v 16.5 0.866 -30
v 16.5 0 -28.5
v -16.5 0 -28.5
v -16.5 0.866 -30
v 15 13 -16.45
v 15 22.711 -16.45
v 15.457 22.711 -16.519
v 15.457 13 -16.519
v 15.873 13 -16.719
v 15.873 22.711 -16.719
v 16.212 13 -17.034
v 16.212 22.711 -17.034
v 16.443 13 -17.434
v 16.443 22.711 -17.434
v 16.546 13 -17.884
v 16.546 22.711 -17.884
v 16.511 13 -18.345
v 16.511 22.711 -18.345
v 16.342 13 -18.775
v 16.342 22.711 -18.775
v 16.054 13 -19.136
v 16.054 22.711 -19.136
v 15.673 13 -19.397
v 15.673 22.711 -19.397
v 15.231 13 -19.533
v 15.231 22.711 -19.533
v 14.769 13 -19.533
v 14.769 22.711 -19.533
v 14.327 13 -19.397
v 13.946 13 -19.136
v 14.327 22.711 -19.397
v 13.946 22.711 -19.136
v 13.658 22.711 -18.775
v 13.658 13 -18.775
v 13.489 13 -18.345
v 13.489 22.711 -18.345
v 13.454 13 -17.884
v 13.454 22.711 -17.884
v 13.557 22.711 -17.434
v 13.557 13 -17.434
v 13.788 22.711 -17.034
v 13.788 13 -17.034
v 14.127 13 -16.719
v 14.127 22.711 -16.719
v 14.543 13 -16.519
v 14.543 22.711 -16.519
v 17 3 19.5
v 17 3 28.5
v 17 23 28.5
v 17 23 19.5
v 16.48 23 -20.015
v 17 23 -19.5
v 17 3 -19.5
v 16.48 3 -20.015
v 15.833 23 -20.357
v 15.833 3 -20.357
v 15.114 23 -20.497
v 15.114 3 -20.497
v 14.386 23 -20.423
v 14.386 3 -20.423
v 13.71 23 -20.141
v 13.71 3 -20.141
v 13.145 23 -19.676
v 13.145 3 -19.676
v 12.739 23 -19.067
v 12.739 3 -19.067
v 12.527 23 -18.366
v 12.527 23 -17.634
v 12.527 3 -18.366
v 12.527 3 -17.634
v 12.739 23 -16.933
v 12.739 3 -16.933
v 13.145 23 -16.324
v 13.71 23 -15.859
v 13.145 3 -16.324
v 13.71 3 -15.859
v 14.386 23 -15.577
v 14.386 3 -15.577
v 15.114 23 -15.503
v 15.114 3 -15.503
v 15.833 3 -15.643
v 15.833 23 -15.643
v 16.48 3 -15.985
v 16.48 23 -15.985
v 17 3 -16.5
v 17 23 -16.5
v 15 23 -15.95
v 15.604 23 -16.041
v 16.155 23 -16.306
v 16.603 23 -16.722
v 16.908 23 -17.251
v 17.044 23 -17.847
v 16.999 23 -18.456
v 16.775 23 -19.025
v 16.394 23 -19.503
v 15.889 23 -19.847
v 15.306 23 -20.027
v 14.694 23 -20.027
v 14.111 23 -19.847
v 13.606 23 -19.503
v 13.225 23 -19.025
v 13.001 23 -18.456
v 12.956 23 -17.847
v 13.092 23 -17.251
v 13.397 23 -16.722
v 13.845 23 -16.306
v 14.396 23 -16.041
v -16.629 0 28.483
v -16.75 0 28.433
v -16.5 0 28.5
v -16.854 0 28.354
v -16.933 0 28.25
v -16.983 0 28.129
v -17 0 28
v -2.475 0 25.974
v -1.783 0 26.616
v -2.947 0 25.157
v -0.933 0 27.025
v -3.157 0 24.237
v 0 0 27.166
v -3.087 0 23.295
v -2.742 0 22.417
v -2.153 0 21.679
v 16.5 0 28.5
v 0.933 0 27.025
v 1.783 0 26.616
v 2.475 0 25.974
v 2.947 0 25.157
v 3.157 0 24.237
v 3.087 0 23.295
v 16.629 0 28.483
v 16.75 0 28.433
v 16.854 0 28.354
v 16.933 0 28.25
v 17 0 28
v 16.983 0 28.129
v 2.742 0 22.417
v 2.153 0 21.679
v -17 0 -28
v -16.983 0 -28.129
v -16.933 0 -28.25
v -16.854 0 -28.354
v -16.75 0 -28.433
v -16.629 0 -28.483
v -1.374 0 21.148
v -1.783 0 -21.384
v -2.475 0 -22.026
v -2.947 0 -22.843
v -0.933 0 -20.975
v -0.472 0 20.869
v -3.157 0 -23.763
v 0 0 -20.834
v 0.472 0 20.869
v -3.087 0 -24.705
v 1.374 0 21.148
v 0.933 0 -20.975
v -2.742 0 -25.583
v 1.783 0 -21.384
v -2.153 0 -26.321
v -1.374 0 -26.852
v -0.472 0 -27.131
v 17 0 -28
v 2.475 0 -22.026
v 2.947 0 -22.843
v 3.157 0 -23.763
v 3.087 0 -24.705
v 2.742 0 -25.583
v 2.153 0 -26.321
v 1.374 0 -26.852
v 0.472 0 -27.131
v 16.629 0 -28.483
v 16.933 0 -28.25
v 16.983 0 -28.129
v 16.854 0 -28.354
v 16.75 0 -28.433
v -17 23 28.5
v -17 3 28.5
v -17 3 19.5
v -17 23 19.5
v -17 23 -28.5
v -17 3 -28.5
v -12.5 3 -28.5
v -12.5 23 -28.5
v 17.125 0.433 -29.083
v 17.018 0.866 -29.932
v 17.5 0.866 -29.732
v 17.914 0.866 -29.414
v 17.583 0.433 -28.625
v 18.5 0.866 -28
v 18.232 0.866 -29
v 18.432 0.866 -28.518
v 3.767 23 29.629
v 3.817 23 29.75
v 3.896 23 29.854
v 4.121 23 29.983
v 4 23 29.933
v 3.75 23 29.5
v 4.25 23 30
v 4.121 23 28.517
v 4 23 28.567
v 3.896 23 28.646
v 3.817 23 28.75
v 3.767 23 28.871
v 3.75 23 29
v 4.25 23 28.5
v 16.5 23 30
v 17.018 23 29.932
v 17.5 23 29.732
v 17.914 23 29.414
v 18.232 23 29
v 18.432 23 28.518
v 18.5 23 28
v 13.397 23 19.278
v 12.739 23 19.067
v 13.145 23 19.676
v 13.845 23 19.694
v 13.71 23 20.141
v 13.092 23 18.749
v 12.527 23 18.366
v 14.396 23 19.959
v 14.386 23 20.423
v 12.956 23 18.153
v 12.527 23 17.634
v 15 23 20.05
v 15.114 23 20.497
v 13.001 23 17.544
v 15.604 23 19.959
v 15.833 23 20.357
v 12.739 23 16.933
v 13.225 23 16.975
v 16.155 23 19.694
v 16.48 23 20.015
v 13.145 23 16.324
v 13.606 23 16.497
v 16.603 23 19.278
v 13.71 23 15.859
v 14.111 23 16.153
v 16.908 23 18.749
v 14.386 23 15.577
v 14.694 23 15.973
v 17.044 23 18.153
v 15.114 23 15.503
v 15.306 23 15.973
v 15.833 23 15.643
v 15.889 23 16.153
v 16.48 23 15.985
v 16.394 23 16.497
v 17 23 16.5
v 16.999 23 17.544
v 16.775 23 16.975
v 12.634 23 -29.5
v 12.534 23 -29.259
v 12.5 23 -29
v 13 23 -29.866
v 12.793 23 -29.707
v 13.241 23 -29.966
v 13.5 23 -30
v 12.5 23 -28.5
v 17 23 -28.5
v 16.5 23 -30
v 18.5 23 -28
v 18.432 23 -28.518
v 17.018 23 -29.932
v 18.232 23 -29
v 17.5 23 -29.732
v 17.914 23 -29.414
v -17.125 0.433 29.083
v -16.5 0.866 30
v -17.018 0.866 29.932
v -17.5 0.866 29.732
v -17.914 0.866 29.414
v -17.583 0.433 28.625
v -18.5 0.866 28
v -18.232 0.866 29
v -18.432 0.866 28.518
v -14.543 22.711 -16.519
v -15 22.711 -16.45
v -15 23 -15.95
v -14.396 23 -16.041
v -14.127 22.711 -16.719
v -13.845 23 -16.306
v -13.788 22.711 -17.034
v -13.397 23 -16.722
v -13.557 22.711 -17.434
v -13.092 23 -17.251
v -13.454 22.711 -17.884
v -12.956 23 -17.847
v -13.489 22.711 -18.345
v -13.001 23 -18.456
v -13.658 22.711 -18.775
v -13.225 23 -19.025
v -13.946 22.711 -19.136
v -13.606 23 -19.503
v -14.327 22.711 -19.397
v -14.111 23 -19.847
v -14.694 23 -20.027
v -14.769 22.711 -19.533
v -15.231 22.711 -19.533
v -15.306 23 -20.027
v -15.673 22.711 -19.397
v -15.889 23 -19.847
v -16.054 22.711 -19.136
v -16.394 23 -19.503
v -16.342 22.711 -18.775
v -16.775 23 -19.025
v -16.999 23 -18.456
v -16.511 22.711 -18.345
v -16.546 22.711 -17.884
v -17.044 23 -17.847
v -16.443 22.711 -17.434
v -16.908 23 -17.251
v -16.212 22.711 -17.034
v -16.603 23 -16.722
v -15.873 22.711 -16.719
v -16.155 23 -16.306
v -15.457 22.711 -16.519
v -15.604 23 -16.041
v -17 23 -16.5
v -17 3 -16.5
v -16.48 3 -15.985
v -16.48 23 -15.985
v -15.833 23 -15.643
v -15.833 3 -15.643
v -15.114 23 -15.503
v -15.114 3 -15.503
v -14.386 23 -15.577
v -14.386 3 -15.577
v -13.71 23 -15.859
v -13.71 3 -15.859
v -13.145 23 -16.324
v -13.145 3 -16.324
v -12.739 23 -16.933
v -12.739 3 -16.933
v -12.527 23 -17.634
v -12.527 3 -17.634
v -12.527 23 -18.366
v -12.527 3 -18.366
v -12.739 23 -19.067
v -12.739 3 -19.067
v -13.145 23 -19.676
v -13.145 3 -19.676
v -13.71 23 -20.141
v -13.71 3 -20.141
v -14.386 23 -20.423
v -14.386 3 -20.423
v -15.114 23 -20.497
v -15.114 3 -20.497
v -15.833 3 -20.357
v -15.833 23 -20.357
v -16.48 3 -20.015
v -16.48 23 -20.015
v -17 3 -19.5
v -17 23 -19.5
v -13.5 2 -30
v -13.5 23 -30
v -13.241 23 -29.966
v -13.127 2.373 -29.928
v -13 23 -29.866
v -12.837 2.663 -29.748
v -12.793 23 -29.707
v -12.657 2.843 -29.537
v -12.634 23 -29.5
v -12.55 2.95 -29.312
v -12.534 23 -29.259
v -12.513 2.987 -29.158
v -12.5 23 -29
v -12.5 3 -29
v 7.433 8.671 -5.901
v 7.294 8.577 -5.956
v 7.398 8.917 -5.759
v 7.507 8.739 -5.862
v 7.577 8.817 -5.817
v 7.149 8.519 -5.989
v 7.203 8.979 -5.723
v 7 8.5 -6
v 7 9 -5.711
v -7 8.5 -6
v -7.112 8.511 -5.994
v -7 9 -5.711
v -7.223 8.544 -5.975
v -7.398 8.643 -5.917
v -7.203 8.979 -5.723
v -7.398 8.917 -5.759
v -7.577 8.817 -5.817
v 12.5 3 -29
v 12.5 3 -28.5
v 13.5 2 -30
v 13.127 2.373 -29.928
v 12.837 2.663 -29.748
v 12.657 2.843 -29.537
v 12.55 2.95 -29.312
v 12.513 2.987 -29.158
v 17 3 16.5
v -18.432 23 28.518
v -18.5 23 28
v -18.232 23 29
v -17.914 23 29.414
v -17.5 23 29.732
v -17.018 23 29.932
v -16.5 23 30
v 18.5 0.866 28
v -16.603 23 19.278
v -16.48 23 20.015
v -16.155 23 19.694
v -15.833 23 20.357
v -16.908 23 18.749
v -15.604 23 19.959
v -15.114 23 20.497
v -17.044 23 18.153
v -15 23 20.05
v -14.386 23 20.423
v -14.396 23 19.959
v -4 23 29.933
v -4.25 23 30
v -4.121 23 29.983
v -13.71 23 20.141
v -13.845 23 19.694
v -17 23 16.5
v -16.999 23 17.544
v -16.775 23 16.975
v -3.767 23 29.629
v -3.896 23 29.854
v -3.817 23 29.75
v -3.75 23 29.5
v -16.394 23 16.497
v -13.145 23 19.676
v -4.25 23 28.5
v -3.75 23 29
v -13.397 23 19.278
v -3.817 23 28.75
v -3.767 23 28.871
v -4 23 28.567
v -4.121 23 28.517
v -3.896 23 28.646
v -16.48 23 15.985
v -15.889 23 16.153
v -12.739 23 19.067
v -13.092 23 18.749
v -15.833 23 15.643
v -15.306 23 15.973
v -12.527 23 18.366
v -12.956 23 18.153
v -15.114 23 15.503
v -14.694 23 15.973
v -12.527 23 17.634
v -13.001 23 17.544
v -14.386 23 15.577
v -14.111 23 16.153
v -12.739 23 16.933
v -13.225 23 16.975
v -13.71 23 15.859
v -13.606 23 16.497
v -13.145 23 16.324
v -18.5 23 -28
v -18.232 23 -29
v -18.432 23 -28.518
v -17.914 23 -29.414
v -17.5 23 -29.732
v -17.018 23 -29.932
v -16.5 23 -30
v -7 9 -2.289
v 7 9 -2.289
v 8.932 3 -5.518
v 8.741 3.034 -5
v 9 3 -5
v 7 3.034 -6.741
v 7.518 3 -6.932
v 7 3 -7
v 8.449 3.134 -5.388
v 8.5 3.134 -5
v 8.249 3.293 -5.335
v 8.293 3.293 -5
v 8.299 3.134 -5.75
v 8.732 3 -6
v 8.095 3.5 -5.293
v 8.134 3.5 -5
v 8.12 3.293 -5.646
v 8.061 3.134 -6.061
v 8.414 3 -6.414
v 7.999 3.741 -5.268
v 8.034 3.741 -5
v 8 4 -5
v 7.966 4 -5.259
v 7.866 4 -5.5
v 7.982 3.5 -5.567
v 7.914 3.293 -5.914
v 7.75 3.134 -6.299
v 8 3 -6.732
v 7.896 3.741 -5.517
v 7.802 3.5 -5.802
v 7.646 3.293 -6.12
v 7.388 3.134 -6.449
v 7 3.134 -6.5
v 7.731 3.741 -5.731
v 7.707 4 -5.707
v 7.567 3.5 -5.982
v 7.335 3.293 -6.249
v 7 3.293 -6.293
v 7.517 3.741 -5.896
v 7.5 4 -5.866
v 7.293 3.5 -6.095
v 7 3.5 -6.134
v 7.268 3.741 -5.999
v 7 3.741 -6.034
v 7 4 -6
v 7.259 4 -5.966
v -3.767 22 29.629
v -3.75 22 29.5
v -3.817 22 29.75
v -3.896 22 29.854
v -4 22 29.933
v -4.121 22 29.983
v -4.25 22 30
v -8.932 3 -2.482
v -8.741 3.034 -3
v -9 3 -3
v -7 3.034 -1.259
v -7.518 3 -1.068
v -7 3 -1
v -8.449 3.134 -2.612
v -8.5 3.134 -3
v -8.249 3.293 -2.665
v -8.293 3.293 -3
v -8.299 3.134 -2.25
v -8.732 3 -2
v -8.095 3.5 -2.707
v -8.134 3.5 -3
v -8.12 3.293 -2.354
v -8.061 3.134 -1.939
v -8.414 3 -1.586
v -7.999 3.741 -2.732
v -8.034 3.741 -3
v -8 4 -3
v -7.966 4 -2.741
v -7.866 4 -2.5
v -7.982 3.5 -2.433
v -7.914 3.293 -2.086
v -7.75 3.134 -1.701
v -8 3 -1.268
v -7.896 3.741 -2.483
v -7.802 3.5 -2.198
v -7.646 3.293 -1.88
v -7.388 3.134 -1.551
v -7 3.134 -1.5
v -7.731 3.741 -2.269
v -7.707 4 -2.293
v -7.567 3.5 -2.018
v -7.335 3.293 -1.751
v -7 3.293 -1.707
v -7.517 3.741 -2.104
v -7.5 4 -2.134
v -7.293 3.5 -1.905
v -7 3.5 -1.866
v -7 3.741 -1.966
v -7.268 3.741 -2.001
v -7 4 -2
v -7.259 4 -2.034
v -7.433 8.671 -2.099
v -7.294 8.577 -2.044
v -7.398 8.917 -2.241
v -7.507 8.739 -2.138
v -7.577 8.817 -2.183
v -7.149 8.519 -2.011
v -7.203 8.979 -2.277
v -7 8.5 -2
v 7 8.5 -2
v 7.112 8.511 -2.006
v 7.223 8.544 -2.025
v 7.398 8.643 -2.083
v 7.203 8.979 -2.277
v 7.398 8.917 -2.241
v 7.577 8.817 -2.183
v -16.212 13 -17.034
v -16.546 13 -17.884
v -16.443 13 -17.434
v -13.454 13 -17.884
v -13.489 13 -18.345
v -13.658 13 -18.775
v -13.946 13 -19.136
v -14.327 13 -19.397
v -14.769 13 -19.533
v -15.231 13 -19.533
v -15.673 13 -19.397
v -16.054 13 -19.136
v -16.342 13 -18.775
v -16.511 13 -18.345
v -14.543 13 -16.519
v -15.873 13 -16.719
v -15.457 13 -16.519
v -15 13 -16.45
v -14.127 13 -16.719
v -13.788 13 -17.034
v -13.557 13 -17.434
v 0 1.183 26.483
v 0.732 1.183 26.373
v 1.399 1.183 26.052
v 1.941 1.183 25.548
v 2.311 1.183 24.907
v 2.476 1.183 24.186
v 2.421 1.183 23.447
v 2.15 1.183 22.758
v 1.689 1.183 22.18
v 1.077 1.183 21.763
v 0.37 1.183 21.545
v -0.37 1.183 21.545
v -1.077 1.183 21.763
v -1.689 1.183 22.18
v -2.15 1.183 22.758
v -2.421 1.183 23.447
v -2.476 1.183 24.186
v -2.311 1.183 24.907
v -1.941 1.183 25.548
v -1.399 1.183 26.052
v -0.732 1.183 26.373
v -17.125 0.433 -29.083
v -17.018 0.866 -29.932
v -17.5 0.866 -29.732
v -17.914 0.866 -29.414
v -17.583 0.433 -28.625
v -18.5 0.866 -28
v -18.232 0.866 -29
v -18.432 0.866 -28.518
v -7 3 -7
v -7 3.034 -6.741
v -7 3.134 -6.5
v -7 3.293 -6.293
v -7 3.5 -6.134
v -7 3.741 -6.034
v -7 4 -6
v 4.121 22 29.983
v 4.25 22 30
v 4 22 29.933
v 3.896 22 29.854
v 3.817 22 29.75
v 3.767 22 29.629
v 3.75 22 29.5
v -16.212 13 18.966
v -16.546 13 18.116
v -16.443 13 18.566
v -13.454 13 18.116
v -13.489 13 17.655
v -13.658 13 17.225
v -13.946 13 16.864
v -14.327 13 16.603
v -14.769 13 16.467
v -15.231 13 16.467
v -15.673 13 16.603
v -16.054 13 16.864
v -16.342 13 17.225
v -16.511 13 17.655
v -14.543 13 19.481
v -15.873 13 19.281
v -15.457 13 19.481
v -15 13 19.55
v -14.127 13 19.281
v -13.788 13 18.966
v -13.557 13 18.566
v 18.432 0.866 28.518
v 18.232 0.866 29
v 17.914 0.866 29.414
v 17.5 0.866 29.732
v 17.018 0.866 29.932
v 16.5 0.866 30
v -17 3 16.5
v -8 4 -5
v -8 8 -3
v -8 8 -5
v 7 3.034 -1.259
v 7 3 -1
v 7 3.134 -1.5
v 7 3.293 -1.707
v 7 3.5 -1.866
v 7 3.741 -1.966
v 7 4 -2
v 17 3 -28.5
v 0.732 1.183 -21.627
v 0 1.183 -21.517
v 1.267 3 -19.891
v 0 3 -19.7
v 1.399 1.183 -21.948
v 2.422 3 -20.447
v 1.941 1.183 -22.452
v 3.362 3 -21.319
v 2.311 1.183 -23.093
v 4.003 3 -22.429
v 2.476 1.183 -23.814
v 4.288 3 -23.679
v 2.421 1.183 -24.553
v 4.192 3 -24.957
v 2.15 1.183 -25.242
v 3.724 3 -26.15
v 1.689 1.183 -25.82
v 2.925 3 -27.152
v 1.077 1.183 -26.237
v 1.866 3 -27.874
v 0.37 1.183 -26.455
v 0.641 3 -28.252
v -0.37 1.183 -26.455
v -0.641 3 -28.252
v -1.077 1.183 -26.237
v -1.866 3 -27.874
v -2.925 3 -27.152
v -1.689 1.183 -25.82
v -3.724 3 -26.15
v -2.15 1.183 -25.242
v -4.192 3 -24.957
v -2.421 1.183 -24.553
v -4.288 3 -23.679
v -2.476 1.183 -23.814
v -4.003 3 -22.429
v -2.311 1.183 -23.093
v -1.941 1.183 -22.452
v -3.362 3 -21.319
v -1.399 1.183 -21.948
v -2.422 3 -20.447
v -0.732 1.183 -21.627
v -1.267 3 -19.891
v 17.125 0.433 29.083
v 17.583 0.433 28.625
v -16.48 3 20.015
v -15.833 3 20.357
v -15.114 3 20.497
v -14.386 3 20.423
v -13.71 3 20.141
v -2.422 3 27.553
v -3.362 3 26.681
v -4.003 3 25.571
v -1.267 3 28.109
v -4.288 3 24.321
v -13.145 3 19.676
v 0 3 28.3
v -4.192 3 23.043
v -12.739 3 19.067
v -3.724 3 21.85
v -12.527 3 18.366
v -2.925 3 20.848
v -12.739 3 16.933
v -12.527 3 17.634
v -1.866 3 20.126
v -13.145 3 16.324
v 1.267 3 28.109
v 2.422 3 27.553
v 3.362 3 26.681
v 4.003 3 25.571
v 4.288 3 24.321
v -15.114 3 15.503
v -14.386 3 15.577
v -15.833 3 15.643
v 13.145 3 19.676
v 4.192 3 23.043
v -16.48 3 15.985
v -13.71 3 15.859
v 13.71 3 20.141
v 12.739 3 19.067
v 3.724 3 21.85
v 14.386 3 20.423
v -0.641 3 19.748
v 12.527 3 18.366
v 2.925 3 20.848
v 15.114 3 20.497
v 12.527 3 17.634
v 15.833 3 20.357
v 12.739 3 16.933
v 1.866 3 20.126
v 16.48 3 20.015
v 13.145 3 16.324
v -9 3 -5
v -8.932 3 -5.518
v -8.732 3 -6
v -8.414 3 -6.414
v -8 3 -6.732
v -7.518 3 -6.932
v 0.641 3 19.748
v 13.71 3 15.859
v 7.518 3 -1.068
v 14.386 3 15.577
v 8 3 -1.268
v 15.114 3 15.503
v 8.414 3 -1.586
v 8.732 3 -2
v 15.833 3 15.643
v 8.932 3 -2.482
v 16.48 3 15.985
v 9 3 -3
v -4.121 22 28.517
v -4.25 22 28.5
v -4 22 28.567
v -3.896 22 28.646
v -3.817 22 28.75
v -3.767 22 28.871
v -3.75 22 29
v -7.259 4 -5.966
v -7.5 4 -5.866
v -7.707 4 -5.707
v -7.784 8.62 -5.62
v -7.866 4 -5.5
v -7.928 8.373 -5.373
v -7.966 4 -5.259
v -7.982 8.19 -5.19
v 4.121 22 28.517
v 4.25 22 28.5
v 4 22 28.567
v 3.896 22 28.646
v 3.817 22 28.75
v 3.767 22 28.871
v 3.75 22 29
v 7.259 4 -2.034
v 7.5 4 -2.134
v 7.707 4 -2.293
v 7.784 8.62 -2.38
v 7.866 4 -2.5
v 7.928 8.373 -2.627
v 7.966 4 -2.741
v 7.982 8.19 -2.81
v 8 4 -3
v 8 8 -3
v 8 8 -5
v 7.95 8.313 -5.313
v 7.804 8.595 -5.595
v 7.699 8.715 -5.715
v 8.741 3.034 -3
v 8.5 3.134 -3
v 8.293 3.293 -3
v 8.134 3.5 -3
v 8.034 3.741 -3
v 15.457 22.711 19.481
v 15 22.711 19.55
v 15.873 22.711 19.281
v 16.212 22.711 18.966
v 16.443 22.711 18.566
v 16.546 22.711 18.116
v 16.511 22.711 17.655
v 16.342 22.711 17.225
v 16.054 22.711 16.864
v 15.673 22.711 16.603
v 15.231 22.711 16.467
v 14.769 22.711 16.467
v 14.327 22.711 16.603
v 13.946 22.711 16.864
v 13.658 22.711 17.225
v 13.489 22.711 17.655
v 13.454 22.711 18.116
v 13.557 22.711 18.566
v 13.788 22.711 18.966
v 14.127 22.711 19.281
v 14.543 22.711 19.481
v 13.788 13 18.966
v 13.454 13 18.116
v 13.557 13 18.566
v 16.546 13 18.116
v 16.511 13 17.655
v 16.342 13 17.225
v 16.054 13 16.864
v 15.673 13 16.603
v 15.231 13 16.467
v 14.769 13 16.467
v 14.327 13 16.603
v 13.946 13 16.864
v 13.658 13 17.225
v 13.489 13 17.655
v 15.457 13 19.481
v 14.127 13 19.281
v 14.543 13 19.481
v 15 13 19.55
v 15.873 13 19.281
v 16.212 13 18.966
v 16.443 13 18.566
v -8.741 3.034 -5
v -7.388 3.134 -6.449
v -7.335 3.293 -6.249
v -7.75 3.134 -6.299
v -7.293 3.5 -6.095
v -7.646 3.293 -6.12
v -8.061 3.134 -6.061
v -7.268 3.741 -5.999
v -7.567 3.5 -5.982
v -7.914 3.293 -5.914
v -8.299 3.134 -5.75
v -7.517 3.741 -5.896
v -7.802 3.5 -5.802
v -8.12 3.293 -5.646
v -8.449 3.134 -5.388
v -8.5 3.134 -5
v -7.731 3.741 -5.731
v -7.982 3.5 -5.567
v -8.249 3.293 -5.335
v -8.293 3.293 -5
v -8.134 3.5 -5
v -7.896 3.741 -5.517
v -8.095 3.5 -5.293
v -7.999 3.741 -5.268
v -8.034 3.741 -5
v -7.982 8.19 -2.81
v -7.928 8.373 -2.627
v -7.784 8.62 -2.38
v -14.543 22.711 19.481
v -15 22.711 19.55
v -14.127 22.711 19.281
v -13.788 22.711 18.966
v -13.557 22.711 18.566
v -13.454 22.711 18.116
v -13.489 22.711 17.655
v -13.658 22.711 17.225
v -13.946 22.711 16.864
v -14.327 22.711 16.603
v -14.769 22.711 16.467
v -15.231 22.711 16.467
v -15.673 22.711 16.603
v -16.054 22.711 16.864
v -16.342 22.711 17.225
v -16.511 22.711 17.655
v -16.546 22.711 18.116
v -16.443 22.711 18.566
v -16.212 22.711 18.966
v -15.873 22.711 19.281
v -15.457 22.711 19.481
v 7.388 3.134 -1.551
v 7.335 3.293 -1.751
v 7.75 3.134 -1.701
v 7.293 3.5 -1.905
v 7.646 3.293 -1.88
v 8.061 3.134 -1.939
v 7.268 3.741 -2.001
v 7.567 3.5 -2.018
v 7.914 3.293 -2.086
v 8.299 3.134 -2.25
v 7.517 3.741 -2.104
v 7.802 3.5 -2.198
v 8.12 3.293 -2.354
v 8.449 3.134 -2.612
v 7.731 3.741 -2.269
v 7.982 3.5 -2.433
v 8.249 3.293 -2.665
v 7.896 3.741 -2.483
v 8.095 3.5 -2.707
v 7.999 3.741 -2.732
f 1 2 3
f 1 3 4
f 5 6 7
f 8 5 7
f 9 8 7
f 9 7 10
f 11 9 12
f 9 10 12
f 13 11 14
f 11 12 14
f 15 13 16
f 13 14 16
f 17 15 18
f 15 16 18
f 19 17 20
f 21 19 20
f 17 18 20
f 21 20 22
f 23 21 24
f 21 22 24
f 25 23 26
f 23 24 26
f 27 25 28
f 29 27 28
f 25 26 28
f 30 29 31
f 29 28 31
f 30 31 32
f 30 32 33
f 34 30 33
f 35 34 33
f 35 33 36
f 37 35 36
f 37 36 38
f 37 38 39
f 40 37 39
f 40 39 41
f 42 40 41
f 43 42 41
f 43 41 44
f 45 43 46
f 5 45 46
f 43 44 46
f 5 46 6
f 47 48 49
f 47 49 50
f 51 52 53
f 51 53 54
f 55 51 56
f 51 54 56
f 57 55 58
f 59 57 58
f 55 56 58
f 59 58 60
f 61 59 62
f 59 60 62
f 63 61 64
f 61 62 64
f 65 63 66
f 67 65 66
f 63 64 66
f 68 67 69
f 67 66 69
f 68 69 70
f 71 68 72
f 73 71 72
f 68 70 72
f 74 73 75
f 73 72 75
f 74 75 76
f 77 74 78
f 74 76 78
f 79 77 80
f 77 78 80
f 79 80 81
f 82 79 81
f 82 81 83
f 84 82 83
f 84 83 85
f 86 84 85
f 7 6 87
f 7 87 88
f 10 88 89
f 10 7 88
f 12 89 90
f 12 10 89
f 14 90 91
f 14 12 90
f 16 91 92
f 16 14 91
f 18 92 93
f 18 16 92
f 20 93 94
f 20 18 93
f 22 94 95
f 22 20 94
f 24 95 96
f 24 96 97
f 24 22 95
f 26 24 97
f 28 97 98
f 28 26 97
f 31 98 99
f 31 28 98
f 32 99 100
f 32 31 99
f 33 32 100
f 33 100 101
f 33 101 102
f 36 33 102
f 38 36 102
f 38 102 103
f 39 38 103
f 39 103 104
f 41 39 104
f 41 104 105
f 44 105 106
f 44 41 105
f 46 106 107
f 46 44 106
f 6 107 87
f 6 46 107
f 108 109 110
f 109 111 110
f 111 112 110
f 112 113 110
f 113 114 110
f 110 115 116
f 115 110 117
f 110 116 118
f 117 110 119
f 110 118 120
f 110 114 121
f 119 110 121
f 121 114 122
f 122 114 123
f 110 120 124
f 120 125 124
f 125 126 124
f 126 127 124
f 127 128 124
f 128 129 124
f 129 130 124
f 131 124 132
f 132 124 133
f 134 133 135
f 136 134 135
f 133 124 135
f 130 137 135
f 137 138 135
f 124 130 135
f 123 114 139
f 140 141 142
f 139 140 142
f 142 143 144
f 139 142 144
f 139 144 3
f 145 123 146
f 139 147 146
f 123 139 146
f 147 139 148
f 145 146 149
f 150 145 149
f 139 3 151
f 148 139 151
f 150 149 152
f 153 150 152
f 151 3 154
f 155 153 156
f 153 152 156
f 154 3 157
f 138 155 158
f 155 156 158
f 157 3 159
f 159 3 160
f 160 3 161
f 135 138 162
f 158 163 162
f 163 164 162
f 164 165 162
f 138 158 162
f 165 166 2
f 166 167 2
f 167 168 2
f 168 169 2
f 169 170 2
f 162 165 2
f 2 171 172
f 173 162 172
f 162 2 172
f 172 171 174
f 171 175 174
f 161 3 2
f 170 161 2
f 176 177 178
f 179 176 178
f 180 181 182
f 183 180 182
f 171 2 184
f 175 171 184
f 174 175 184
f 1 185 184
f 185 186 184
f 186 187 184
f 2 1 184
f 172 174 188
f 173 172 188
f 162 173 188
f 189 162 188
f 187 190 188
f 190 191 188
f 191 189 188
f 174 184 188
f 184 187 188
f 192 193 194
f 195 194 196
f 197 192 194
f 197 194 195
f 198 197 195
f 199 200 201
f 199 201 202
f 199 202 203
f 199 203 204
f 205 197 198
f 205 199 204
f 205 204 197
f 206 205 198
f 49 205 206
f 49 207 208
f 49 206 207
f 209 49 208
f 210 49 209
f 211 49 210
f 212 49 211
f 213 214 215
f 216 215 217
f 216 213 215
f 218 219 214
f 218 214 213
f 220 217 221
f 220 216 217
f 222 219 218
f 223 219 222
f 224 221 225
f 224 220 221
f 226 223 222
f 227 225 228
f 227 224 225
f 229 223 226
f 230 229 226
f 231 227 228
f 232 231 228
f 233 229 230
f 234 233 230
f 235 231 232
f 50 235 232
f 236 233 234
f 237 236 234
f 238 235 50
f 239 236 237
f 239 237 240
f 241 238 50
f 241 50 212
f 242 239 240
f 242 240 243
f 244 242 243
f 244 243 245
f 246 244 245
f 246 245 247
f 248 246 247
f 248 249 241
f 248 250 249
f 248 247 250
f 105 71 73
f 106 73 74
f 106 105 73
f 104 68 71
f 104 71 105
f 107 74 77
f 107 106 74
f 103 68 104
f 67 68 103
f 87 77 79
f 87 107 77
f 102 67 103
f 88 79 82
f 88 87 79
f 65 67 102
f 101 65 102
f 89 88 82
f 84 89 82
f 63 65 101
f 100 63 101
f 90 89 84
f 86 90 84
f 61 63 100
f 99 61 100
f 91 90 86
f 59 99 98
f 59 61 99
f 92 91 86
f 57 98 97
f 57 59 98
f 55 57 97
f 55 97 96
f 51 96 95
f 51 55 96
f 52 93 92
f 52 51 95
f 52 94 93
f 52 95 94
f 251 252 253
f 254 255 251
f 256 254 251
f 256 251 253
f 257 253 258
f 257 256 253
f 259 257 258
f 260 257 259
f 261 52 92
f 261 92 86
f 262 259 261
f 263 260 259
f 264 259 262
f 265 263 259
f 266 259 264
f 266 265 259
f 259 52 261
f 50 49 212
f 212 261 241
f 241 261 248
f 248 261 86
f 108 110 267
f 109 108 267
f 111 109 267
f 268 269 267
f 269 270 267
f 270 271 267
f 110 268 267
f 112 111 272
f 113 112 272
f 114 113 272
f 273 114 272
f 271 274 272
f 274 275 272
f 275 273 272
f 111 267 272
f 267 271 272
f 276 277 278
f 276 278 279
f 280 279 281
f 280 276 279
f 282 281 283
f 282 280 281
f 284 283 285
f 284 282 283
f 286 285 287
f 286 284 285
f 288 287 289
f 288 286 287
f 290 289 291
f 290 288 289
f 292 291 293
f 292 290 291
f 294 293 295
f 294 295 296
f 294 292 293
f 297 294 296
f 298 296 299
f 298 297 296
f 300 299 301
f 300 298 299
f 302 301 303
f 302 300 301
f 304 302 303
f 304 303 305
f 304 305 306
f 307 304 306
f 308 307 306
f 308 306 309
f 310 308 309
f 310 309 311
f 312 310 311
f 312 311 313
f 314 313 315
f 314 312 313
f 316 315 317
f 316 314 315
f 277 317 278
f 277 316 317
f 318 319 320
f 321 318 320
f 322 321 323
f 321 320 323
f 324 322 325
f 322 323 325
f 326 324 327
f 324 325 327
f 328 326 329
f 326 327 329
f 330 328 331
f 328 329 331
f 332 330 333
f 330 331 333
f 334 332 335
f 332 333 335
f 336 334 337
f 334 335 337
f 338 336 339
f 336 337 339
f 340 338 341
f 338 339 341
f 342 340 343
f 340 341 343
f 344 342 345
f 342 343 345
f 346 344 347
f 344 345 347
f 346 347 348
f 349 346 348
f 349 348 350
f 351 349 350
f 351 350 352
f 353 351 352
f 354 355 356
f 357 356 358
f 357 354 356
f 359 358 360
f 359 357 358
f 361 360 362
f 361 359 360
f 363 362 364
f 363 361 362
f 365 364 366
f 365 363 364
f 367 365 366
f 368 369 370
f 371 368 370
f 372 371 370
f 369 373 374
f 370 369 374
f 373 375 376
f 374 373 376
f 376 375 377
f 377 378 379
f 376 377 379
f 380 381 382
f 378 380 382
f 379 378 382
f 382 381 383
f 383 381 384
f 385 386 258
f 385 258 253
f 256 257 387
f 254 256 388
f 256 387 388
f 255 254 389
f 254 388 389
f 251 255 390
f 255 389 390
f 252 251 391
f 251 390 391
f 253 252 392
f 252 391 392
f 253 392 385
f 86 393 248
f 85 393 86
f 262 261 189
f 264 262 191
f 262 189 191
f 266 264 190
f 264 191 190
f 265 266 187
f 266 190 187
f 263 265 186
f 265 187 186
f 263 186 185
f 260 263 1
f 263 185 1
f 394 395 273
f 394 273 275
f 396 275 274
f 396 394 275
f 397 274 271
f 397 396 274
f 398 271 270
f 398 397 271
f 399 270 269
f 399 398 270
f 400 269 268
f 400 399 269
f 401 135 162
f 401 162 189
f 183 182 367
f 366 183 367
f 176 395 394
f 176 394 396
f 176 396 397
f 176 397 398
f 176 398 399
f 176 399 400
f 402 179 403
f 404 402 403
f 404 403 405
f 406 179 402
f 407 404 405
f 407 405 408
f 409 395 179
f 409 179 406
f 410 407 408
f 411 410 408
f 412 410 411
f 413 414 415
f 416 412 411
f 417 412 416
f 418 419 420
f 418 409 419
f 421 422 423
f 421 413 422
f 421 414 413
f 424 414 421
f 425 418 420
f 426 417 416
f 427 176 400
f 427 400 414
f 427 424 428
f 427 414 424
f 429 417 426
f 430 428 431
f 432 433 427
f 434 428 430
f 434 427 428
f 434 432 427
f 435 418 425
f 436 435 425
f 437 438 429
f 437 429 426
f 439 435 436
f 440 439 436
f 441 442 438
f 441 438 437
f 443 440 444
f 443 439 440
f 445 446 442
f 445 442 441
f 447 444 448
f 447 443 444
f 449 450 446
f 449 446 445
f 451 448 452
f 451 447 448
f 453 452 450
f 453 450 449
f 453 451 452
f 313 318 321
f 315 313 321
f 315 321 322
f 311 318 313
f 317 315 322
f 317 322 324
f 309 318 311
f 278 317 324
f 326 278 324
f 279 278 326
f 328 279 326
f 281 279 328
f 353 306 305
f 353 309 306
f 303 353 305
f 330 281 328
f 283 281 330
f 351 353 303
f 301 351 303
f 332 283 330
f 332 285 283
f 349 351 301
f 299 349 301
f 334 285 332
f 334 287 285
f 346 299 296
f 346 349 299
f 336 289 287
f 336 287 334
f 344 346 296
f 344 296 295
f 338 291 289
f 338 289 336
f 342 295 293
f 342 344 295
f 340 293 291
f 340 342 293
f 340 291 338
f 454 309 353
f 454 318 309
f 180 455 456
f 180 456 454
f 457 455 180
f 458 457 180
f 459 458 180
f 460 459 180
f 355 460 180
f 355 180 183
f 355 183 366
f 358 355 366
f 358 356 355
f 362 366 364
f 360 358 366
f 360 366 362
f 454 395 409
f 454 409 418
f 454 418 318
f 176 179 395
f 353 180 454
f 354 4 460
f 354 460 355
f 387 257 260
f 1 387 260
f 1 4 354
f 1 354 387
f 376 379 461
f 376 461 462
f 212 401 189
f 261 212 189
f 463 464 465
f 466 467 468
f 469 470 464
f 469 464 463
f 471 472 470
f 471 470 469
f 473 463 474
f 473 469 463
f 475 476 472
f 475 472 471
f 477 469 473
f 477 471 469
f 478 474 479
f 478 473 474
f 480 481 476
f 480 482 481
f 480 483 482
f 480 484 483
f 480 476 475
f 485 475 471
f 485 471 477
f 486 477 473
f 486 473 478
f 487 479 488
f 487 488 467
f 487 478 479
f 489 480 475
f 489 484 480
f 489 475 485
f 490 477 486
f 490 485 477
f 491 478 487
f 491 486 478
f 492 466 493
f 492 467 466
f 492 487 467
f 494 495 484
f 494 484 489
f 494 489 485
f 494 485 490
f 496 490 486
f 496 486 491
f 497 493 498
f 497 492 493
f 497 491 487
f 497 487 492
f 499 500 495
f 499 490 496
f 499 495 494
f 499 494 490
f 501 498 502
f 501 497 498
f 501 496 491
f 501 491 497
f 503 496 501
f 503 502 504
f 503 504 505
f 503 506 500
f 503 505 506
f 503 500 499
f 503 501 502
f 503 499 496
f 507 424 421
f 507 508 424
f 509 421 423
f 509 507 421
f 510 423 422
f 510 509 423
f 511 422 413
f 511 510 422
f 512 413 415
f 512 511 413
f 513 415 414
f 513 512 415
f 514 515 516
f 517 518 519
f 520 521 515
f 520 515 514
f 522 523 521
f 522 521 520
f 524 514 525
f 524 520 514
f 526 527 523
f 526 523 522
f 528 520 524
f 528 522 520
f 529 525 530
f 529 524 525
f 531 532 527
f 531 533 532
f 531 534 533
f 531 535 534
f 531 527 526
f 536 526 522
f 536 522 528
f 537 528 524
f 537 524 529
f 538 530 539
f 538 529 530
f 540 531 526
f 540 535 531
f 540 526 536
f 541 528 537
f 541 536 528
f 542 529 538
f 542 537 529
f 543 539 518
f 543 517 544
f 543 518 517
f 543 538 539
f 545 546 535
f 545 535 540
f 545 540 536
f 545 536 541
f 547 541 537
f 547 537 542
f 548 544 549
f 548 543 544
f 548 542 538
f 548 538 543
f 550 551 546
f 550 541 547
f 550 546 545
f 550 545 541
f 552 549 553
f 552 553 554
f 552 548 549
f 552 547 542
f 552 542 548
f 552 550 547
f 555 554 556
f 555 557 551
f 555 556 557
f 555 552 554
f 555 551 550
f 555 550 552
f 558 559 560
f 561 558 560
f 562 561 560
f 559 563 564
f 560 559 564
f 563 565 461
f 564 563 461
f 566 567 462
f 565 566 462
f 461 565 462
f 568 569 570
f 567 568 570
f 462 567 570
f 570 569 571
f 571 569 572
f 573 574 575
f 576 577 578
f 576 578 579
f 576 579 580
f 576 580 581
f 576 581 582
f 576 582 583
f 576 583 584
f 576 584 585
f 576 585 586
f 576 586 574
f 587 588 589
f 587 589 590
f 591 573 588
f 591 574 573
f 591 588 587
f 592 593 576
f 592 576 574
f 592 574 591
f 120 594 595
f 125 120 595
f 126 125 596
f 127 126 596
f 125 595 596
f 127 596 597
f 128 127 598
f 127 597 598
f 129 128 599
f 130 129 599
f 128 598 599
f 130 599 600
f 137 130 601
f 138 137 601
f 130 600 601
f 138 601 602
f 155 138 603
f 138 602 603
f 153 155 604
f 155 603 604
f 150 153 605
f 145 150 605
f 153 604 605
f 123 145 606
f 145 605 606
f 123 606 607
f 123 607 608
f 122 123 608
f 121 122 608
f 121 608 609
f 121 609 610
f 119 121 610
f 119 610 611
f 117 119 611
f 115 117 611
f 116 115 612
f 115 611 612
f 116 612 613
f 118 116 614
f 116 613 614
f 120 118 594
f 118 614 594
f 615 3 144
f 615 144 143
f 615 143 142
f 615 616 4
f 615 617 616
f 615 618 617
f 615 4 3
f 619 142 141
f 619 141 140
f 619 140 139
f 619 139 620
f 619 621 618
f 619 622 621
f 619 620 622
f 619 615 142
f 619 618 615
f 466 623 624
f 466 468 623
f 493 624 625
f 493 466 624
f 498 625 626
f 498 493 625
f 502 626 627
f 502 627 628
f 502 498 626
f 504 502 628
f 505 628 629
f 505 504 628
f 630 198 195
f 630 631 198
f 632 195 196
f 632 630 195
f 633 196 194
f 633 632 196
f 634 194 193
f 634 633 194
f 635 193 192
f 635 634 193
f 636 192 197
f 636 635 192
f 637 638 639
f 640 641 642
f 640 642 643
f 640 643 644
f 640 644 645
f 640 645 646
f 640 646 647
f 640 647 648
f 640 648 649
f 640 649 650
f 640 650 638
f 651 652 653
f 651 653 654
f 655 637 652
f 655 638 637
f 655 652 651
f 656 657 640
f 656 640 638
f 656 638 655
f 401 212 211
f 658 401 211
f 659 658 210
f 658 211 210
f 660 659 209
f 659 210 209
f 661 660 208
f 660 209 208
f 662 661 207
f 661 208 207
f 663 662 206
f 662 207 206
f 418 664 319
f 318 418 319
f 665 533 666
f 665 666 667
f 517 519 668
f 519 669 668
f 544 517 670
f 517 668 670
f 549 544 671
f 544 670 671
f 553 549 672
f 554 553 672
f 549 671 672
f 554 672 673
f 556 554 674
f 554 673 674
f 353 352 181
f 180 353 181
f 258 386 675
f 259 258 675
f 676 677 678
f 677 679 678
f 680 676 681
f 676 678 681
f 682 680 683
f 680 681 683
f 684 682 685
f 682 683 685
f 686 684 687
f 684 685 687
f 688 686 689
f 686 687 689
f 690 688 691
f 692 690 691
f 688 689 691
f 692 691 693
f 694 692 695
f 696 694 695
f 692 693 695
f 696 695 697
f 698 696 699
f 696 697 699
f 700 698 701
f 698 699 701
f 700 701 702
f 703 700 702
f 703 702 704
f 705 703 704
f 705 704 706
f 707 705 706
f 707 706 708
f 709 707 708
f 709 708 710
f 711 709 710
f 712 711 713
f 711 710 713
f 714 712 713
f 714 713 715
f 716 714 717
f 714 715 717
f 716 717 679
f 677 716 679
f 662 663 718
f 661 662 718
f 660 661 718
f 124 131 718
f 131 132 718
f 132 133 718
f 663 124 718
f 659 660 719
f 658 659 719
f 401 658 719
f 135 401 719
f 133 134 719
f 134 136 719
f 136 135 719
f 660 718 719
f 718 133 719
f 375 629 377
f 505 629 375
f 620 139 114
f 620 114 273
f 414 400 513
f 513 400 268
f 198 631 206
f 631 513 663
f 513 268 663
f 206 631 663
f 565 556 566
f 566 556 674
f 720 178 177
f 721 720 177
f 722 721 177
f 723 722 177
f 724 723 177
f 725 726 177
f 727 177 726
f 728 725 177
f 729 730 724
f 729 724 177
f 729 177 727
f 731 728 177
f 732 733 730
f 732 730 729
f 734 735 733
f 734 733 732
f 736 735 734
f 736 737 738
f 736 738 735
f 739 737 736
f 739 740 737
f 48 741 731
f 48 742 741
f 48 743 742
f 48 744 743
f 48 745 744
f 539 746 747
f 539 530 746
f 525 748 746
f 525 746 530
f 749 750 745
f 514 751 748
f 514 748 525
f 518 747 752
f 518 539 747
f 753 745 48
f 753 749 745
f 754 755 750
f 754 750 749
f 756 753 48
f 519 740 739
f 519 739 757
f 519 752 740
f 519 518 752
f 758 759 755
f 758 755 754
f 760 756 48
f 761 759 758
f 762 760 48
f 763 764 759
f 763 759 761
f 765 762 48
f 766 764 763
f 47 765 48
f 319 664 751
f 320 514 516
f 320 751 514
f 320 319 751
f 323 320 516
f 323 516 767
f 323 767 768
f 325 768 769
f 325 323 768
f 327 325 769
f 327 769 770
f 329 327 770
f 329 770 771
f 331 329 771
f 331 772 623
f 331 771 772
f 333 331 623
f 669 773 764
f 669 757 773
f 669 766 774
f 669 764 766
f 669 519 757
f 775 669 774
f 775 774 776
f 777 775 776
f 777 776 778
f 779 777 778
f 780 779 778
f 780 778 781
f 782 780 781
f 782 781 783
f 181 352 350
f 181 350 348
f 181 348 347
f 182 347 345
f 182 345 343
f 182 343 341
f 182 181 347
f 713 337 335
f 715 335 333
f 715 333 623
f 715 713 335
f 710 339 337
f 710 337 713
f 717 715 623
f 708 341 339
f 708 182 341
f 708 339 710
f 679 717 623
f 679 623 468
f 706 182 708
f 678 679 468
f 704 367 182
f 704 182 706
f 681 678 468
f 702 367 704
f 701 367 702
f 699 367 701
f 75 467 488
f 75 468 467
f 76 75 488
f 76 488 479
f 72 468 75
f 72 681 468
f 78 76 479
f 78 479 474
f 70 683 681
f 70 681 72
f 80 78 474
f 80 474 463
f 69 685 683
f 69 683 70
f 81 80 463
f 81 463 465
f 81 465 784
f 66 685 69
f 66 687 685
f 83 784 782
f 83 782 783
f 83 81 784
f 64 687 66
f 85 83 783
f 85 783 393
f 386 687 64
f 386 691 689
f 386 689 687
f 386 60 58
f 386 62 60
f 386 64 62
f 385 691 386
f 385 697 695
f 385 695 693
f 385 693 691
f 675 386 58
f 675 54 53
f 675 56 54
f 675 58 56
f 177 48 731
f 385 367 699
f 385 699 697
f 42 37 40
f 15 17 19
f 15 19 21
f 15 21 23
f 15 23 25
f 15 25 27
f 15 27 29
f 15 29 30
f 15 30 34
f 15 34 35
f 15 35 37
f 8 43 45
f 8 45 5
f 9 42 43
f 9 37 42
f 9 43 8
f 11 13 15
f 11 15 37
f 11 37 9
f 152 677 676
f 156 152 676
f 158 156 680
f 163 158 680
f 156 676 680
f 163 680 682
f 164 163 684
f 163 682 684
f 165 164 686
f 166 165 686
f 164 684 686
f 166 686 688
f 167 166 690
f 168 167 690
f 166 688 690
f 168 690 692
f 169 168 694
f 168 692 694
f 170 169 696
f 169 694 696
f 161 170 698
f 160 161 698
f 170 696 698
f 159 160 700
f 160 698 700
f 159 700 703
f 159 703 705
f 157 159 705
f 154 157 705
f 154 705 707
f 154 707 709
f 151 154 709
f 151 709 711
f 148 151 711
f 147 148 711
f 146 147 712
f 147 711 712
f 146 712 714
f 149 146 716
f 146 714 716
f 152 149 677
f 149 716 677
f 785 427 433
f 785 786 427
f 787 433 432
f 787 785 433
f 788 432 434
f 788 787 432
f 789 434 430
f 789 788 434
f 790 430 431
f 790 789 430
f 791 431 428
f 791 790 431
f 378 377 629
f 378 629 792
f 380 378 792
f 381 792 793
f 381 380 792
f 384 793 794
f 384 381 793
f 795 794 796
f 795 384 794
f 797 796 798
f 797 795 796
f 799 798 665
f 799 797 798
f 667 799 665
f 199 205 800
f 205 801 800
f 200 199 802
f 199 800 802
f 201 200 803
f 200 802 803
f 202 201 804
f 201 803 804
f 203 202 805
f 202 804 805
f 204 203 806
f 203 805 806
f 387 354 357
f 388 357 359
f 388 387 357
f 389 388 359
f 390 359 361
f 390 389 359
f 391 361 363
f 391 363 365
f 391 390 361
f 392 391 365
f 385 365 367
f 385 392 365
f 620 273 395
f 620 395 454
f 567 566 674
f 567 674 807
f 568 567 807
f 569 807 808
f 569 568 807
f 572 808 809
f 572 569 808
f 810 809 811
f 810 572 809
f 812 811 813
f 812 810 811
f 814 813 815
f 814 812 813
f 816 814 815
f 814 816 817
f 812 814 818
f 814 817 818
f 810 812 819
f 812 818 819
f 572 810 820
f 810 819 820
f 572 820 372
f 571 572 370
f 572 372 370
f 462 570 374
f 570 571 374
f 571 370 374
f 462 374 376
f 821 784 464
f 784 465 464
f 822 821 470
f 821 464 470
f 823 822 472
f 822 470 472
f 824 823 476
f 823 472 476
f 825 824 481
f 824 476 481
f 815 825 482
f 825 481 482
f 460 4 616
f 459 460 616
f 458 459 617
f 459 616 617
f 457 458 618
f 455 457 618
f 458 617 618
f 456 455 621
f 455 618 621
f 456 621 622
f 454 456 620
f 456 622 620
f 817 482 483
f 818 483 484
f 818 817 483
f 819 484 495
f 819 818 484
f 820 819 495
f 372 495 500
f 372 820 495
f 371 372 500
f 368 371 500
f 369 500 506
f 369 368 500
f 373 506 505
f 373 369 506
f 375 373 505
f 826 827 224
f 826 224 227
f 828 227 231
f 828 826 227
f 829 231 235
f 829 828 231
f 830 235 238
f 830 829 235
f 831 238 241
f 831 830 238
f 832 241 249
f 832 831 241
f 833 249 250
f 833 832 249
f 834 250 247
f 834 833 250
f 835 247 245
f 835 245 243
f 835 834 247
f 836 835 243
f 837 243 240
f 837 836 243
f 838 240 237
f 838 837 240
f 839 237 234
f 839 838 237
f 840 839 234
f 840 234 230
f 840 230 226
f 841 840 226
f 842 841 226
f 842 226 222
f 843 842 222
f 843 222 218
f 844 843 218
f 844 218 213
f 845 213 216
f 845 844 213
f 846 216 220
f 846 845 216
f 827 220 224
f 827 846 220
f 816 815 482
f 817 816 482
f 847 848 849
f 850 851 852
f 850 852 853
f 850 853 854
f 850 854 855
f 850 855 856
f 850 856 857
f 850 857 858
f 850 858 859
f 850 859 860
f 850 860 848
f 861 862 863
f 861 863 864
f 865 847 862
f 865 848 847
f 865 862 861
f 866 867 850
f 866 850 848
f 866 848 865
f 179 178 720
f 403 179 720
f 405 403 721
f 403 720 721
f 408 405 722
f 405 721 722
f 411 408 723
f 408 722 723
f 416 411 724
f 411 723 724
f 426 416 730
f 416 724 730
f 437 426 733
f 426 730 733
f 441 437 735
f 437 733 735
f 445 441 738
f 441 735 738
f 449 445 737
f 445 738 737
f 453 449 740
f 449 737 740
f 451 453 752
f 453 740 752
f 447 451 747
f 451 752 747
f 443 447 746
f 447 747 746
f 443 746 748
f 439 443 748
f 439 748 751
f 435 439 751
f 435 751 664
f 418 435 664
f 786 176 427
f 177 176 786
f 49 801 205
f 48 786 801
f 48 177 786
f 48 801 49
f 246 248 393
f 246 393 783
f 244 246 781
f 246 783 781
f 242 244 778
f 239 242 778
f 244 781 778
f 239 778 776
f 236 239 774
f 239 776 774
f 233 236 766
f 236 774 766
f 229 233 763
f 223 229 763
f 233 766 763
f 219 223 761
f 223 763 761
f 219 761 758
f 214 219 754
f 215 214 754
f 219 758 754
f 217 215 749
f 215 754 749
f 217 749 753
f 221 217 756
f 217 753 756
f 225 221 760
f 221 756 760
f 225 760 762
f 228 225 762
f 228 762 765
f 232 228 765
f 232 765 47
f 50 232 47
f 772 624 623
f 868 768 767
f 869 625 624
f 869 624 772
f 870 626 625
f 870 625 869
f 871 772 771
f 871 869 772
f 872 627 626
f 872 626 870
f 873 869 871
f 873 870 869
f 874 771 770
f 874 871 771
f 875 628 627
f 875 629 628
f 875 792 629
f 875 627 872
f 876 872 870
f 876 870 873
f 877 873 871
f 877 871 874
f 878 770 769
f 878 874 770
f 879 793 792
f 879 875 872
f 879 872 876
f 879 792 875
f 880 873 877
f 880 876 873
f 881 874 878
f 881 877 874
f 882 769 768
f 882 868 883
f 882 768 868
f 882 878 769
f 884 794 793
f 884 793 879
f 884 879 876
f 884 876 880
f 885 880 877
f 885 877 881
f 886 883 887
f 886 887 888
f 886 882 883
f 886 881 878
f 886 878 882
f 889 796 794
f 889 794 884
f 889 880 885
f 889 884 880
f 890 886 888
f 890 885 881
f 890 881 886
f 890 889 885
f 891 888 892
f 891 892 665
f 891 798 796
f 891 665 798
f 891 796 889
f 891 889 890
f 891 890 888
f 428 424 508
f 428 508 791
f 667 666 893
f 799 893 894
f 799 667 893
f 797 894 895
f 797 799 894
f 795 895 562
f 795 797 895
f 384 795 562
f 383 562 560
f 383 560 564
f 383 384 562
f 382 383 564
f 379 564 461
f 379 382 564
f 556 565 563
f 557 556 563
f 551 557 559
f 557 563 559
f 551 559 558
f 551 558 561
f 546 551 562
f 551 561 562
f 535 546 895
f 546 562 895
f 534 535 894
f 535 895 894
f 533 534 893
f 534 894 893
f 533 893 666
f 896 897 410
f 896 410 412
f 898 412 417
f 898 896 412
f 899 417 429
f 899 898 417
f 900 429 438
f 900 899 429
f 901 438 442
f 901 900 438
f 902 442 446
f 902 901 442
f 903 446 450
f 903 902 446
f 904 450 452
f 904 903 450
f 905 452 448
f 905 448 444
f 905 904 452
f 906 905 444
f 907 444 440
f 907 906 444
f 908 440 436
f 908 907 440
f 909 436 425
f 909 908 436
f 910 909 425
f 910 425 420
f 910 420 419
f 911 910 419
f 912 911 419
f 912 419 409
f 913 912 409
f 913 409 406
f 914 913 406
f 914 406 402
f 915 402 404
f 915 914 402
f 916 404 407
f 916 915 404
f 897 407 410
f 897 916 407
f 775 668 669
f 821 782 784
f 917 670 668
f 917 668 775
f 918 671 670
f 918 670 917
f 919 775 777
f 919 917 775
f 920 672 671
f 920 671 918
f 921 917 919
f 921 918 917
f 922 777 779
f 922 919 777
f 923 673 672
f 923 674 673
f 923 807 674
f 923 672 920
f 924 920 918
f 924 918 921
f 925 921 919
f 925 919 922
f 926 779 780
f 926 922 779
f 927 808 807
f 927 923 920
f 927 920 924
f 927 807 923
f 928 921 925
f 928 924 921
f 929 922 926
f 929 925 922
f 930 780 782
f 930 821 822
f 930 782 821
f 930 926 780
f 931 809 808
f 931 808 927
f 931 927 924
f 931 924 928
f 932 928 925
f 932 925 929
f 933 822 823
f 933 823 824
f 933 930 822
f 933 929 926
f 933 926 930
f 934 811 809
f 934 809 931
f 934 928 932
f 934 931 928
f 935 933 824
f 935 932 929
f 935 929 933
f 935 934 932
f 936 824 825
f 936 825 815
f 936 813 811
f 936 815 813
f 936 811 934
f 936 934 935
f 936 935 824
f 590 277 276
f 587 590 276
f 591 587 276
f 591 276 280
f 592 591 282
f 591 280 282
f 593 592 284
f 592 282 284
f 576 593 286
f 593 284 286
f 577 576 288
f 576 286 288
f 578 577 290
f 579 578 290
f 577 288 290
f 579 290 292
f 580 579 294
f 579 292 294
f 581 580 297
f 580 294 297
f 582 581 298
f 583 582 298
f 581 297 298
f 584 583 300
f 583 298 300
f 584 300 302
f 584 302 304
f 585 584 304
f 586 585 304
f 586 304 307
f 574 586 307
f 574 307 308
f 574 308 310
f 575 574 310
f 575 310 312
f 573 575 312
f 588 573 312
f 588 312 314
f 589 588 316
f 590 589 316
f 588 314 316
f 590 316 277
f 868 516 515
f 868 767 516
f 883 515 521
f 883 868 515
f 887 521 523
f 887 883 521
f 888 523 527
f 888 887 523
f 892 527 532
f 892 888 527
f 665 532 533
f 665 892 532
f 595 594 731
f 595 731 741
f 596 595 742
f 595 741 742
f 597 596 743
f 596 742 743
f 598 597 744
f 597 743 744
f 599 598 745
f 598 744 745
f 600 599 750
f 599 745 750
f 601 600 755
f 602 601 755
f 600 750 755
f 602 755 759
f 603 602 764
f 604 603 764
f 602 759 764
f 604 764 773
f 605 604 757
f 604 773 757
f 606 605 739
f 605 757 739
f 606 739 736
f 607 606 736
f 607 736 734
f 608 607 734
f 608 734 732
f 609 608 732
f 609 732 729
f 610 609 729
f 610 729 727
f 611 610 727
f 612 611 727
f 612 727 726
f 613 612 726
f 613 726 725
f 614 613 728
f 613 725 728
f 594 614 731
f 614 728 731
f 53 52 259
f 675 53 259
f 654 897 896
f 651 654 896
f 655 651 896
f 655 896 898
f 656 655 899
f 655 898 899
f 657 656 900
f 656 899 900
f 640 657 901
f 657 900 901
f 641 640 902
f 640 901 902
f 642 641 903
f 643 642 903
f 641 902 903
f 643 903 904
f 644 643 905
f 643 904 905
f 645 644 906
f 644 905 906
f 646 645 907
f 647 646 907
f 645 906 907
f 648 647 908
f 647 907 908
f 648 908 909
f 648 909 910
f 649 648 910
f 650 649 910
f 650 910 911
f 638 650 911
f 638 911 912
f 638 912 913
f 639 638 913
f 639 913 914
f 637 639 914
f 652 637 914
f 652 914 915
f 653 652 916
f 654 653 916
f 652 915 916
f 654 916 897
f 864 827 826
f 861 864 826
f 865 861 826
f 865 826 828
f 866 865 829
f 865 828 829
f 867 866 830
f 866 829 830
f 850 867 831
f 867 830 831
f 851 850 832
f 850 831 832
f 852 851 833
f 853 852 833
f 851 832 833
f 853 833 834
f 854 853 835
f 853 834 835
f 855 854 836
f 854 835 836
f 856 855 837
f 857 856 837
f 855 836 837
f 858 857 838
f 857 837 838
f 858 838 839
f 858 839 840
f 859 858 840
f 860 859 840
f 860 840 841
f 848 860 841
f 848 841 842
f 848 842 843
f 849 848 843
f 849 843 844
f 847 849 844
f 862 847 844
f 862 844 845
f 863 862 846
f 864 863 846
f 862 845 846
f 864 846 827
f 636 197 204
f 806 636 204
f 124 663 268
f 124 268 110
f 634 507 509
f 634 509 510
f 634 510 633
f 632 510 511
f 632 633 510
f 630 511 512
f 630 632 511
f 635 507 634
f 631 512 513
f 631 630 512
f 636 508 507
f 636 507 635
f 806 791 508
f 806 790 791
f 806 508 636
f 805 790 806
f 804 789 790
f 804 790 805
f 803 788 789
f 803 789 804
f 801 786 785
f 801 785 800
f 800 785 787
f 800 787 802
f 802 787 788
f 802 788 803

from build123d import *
from OCP.BRepFilletAPI import BRepFilletAPI_MakeChamfer

# Parameters (mm, degrees)
SKETCH_1_W          = 37
SKETCH_1_H          = 60
SKETCH_1_R          = 2.3
EXTRUDE_1_DEPTH     = 3
CHAMFER_1_SIZE      = 2
SKETCH_2_W          = 37
SKETCH_2_H          = 60
SKETCH_2_W_2        = 34
SKETCH_2_H_2        = 57
EXTRUDE_1_2_DEPTH   = 20
SKETCH_3_W          = 25
SKETCH_3_H          = 3.030341357
CUT_EXTRUDE_1_DEPTH = 20
SKETCH_4_R          = 2.5
EXTRUDE_2_DEPTH     = 20
SKETCH_5_R          = 1.55
CUT_EXTRUDE_2_DEPTH = 10
SKETCH_6_W          = 16
SKETCH_6_H          = 4
EXTRUDE_3_DEPTH     = 6
SKETCH_7_W          = 7.5
SKETCH_7_H          = 4.667229269
CUT_EXTRUDE_3_DEPTH = 1
FILLET_2_R          = 0.5
FILLET_3_R          = 2
CHAMFER_4_SIZE      = 0.866025404
CHAMFER_4_SIZE_2    = 1.5
FILLET_4_R          = 1
CHAMFER_5_SIZE      = 0.5
CHAMFER_5_SIZE_2    = 0.288675135
CHAMFER_6_SIZE      = 0.5
CHAMFER_6_SIZE2     = 0.288675135
FILLET_5_R          = 1


with BuildPart() as part:
    # Эскиз1 → Extrude 1 (new body)
    with BuildSketch(Plane(origin=(0, 0, 0), x_dir=(1, 0, 0), z_dir=(0, 1, 0))):
        Rectangle(SKETCH_1_W, SKETCH_1_H)
        with Locations(Location((0, 24, 0), (0, 0, 270))):
            Circle(SKETCH_1_R, mode=Mode.SUBTRACT)
        with Locations(Location((0, -24, 0), (0, 0, 270))):
            Circle(SKETCH_1_R, mode=Mode.SUBTRACT)
    extrude(amount=EXTRUDE_1_DEPTH)

    # Фаска1
    chamfer_1_edges = [part.edges().sort_by_distance(p)[0] for p in [
        (0, 3, -26.3),
        (0, 3, 21.7),
    ]]
    chamfer(chamfer_1_edges, length=CHAMFER_1_SIZE)

    # Эскиз2 → Extrude 1 2 (add)
    with BuildSketch(Plane(origin=(0, 3, 0), x_dir=(1, 0, 0), z_dir=(0, 1, 0))):
        Rectangle(SKETCH_2_W, SKETCH_2_H)
        Rectangle(SKETCH_2_W_2, SKETCH_2_H_2, mode=Mode.SUBTRACT)
    extrude(amount=EXTRUDE_1_2_DEPTH)

    # Эскиз3 → Вырез-Вытянуть1 (cut)
    with BuildSketch(Plane(origin=(0, 23, 0), x_dir=(1, 0, 0), z_dir=(0, 1, 0))):
        with Locations((0, 29.478101209)):
            Rectangle(SKETCH_3_W, SKETCH_3_H)
    extrude(amount=-CUT_EXTRUDE_1_DEPTH, mode=Mode.SUBTRACT)

    # Эскиз4 → Бобышка-Вытянуть2 (add)
    with BuildSketch(Plane(origin=(0, 3, 0), x_dir=(1, 0, 0), z_dir=(0, 1, 0))):
        with Locations((15, 18)):
            Circle(SKETCH_4_R)
        with Locations((-15, 18)):
            Circle(SKETCH_4_R)
        with Locations((15, -18)):
            Circle(SKETCH_4_R)
        with Locations((-15, -18)):
            Circle(SKETCH_4_R)
    extrude(amount=EXTRUDE_2_DEPTH)

    # Эскиз5 → Вырез-Вытянуть2 (cut)
    with BuildSketch(Plane(origin=(0, 23, 0), x_dir=(1, 0, 0), z_dir=(0, 1, 0))):
        with Locations(Location((15, 18, 0), (0, 0, 270))):
            Circle(SKETCH_5_R)
        with Locations(Location((15, -18, 0), (0, 0, 270))):
            Circle(SKETCH_5_R)
        with Locations(Location((-15, -18, 0), (0, 0, 270))):
            Circle(SKETCH_5_R)
        with Locations(Location((-15, 18, 0), (0, 0, 270))):
            Circle(SKETCH_5_R)
    extrude(amount=-CUT_EXTRUDE_2_DEPTH, mode=Mode.SUBTRACT)

    # Эскиз6 → Бобышка-Вытянуть3 (add)
    with BuildSketch(Plane(origin=(0, 3, 0), x_dir=(1, 0, 0), z_dir=(0, 1, 0))):
        with Locations((0, 4)):
            Rectangle(SKETCH_6_W, SKETCH_6_H)
    extrude(amount=EXTRUDE_3_DEPTH)

    # Эскиз7 → Вырез-Вытянуть3 (cut)
    with BuildSketch(Plane(origin=(0, 23, 0), x_dir=(1, 0, 0), z_dir=(0, 1, 0))):
        with Locations((0, -28.649225697)):
            Rectangle(SKETCH_7_W, SKETCH_7_H)
    extrude(amount=-CUT_EXTRUDE_3_DEPTH, mode=Mode.SUBTRACT)

    # Скругление2
    fillet_2_edges = [part.edges().sort_by_distance(p)[0] for p in [
        (-3.75, 22.5, 28.5),
        (3.75, 22.5, 28.5),
        (3.75, 22.5, 30),
        (-3.75, 22.5, 30),
    ]]
    fillet(fillet_2_edges, radius=FILLET_2_R)

    # Скругление3
    fillet_3_edges = [part.edges().sort_by_distance(p)[0] for p in [
        (18.5, 11.5, 30),
        (-18.5, 11.5, 30),
        (-18.5, 11.5, -30),
        (18.5, 11.5, -30),
    ]]
    fillet(fillet_3_edges, radius=FILLET_3_R)

    # Фаска4
    # the kernel refuses this chamfer: 1.5, 0.866025404 mm, written as the material it takes off along each edge
    with BuildSketch(Plane(origin=(0, 0, 24), x_dir=(0, 0, 1), z_dir=(-1, 0, 0))) as chamfer_4_piece_1:
        Polygon((2.3 + CHAMFER_4_SIZE, 0), (2.3, CHAMFER_4_SIZE_2), (2.3, 0), align=None)
    revolve(axis=Axis((0, 0, 24), (0, 1, 0)), mode=Mode.SUBTRACT)
    with BuildSketch(Plane(origin=(16.5, 0, -30), x_dir=(0, -0.01932676561270073, 0.999813220622208), z_dir=(-1, 0, 0))) as chamfer_4_piece_2:
        Polygon((CHAMFER_4_SIZE_2 * 0.999813220622, CHAMFER_4_SIZE_2 * 0.0193267656127), (-CHAMFER_4_SIZE * 0.0193267656079, CHAMFER_4_SIZE * 0.999813220373), (0, 0), align=None)
    extrude(amount=33, mode=Mode.SUBTRACT)
    with BuildSketch(Plane(origin=(-18.5, 0, -28), x_dir=(0.999813220622208, -0.01932676561270073, 0), z_dir=(0, 0, 1)), Plane(origin=(18.5, 0, 28), x_dir=(-0.999813220622208, -0.01932676561270073, 0), z_dir=(0, 0, -1))) as chamfer_4_piece_3:
        Polygon((CHAMFER_4_SIZE_2 * 0.999813220622, CHAMFER_4_SIZE_2 * 0.0193267656127), (-CHAMFER_4_SIZE * 0.0193267656079, CHAMFER_4_SIZE * 0.999813220373), (0, 0), align=None)
    extrude(amount=56, mode=Mode.SUBTRACT)
    with BuildSketch(Plane(origin=(-16.5, 0, 30), x_dir=(0, 0.9983227437537924, 0.0578938624026721), z_dir=(1, 0, 0))) as chamfer_4_piece_4:
        Polygon((CHAMFER_4_SIZE * 0.998322743505, -CHAMFER_4_SIZE * 0.0578938623883), (-CHAMFER_4_SIZE_2 * 0.0578938624027, -CHAMFER_4_SIZE_2 * 0.998322743754), (0, 0), align=None)
    extrude(amount=33, mode=Mode.SUBTRACT)
    with BuildSketch(Plane(origin=(-16.5, 0, -28), x_dir=(0, 0, -1), z_dir=(1, 0, 0))) as chamfer_4_piece_5:
        Polygon((2 - CHAMFER_4_SIZE_2, 0), (2, CHAMFER_4_SIZE), (2, 0), align=None)
    revolve(axis=Axis((-16.5, 0, -28), (0, 1, 0)), revolution_arc=90, mode=Mode.SUBTRACT)
    with BuildSketch(Plane(origin=(-16.5, 0, 28), x_dir=(0, 0, 1), z_dir=(1, 0, 0))) as chamfer_4_piece_6:
        Polygon((2 - CHAMFER_4_SIZE_2, 0), (2, -CHAMFER_4_SIZE), (2, 0), align=None)
    revolve(axis=Axis((-16.5, 0, 28), (0, -1, 0)), revolution_arc=90, mode=Mode.SUBTRACT)
    with BuildSketch(Plane(origin=(16.5, 0, 28), x_dir=(0, 0, 1), z_dir=(-1, 0, 0))) as chamfer_4_piece_7:
        Polygon((2, CHAMFER_4_SIZE), (2 - CHAMFER_4_SIZE_2, 0), (2, 0), align=None)
    revolve(axis=Axis((16.5, 0, 28), (0, 1, 0)), revolution_arc=90, mode=Mode.SUBTRACT)
    with BuildSketch(Plane(origin=(16.5, 0, -28), x_dir=(0, 0, -1), z_dir=(-1, 0, 0))) as chamfer_4_piece_8:
        Polygon((2 - CHAMFER_4_SIZE_2, 0), (2, -CHAMFER_4_SIZE), (2, 0), align=None)
    revolve(axis=Axis((16.5, 0, -28), (0, -1, 0)), revolution_arc=90, mode=Mode.SUBTRACT)
    with BuildSketch(Plane(origin=(0, 0, -24), x_dir=(0, 0, 1), z_dir=(-1, 0, 0))) as chamfer_4_piece_9:
        Polygon((2.3 + CHAMFER_4_SIZE, 0), (2.3, CHAMFER_4_SIZE_2), (2.3, 0), align=None)
    revolve(axis=Axis((0, 0, -24), (0, 1, 0)), mode=Mode.SUBTRACT)

    # Скругление4
    fillet_4_edges = [part.edges().sort_by_distance(p)[0] for p in [
        (-8, 3, -4),
        (-8, 6, -6),
        (0, 3, -2),
        (-8, 6, -2),
        (8, 3, -4),
        (8, 6, -2),
        (0, 3, -6),
        (8, 6, -6),
        (-8, 9, -4),
        (8, 9, -4),
    ]]
    fillet(fillet_4_edges, radius=FILLET_4_R)

    # Фаска5
    # the kernel refuses this chamfer: 0.5, 0.288675135 mm, written as the material it takes off along each edge
    with BuildSketch(Plane(origin=(-8.293542877, 9, -6), x_dir=(0, -0.9998132206222079, -0.019326765612700324), z_dir=(1, 0, 0)), Plane(origin=(8.293542877, 9, -2), x_dir=(0, -0.9998132206222079, 0.01932676561270075), z_dir=(-1, 0, 0))) as chamfer_5_piece_1:
        Polygon((CHAMFER_5_SIZE * 0.999813220622, -CHAMFER_5_SIZE * 0.0193267656127), (-CHAMFER_5_SIZE_2 * 0.0193267655856, -CHAMFER_5_SIZE_2 * 0.999813219219), (0, 0), align=None)
    extrude(amount=16.587085755, mode=Mode.SUBTRACT)

    # Фаска6: one chamfer whose edges measure the first distance from different faces: ONE call of the kernel's chamfer builder (chamfer() names one face for all edges)
    chamfer_6_edges_1 = [part.edges().sort_by_distance(p)[0] for p in [
        (-15, 23, -19.55),
        (-15, 23, 16.45),
    ]]
    chamfer_6_side_1 = [part.faces().sort_by_distance(p)[0] for p in [
        (-10.375, 23, 29.382135735),
    ]]
    chamfer_6_edges_2 = [part.edges().sort_by_distance(p)[0] for p in [
        (15, 23, 16.45),
        (15, 23, -19.55),
    ]]
    chamfer_6_side_2 = [part.faces().sort_by_distance(p)[0] for p in [
        (10.375, 23, 29.382135735),
    ]]
    chamfer_6 = BRepFilletAPI_MakeChamfer(part.part.solid().wrapped)
    for e in chamfer_6_edges_1:
        chamfer_6.Add(CHAMFER_6_SIZE, CHAMFER_6_SIZE2, e.wrapped, chamfer_6_side_1[0].wrapped)  # the first distance lies on this face
    for e in chamfer_6_edges_2:
        chamfer_6.Add(CHAMFER_6_SIZE, CHAMFER_6_SIZE2, e.wrapped, chamfer_6_side_2[0].wrapped)  # the first distance lies on this face
    add(Compound.cast(chamfer_6.Shape()), mode=Mode.REPLACE)

    # Скругление5
    fillet_5_edges = [part.edges().sort_by_distance(p)[0] for p in [
        (0, 3, -30),
        (-12.5, 13, -30),
        (12.5, 13, -30),
    ]]
    fillet(fillet_5_edges, radius=FILLET_5_R)


solid = part.part
